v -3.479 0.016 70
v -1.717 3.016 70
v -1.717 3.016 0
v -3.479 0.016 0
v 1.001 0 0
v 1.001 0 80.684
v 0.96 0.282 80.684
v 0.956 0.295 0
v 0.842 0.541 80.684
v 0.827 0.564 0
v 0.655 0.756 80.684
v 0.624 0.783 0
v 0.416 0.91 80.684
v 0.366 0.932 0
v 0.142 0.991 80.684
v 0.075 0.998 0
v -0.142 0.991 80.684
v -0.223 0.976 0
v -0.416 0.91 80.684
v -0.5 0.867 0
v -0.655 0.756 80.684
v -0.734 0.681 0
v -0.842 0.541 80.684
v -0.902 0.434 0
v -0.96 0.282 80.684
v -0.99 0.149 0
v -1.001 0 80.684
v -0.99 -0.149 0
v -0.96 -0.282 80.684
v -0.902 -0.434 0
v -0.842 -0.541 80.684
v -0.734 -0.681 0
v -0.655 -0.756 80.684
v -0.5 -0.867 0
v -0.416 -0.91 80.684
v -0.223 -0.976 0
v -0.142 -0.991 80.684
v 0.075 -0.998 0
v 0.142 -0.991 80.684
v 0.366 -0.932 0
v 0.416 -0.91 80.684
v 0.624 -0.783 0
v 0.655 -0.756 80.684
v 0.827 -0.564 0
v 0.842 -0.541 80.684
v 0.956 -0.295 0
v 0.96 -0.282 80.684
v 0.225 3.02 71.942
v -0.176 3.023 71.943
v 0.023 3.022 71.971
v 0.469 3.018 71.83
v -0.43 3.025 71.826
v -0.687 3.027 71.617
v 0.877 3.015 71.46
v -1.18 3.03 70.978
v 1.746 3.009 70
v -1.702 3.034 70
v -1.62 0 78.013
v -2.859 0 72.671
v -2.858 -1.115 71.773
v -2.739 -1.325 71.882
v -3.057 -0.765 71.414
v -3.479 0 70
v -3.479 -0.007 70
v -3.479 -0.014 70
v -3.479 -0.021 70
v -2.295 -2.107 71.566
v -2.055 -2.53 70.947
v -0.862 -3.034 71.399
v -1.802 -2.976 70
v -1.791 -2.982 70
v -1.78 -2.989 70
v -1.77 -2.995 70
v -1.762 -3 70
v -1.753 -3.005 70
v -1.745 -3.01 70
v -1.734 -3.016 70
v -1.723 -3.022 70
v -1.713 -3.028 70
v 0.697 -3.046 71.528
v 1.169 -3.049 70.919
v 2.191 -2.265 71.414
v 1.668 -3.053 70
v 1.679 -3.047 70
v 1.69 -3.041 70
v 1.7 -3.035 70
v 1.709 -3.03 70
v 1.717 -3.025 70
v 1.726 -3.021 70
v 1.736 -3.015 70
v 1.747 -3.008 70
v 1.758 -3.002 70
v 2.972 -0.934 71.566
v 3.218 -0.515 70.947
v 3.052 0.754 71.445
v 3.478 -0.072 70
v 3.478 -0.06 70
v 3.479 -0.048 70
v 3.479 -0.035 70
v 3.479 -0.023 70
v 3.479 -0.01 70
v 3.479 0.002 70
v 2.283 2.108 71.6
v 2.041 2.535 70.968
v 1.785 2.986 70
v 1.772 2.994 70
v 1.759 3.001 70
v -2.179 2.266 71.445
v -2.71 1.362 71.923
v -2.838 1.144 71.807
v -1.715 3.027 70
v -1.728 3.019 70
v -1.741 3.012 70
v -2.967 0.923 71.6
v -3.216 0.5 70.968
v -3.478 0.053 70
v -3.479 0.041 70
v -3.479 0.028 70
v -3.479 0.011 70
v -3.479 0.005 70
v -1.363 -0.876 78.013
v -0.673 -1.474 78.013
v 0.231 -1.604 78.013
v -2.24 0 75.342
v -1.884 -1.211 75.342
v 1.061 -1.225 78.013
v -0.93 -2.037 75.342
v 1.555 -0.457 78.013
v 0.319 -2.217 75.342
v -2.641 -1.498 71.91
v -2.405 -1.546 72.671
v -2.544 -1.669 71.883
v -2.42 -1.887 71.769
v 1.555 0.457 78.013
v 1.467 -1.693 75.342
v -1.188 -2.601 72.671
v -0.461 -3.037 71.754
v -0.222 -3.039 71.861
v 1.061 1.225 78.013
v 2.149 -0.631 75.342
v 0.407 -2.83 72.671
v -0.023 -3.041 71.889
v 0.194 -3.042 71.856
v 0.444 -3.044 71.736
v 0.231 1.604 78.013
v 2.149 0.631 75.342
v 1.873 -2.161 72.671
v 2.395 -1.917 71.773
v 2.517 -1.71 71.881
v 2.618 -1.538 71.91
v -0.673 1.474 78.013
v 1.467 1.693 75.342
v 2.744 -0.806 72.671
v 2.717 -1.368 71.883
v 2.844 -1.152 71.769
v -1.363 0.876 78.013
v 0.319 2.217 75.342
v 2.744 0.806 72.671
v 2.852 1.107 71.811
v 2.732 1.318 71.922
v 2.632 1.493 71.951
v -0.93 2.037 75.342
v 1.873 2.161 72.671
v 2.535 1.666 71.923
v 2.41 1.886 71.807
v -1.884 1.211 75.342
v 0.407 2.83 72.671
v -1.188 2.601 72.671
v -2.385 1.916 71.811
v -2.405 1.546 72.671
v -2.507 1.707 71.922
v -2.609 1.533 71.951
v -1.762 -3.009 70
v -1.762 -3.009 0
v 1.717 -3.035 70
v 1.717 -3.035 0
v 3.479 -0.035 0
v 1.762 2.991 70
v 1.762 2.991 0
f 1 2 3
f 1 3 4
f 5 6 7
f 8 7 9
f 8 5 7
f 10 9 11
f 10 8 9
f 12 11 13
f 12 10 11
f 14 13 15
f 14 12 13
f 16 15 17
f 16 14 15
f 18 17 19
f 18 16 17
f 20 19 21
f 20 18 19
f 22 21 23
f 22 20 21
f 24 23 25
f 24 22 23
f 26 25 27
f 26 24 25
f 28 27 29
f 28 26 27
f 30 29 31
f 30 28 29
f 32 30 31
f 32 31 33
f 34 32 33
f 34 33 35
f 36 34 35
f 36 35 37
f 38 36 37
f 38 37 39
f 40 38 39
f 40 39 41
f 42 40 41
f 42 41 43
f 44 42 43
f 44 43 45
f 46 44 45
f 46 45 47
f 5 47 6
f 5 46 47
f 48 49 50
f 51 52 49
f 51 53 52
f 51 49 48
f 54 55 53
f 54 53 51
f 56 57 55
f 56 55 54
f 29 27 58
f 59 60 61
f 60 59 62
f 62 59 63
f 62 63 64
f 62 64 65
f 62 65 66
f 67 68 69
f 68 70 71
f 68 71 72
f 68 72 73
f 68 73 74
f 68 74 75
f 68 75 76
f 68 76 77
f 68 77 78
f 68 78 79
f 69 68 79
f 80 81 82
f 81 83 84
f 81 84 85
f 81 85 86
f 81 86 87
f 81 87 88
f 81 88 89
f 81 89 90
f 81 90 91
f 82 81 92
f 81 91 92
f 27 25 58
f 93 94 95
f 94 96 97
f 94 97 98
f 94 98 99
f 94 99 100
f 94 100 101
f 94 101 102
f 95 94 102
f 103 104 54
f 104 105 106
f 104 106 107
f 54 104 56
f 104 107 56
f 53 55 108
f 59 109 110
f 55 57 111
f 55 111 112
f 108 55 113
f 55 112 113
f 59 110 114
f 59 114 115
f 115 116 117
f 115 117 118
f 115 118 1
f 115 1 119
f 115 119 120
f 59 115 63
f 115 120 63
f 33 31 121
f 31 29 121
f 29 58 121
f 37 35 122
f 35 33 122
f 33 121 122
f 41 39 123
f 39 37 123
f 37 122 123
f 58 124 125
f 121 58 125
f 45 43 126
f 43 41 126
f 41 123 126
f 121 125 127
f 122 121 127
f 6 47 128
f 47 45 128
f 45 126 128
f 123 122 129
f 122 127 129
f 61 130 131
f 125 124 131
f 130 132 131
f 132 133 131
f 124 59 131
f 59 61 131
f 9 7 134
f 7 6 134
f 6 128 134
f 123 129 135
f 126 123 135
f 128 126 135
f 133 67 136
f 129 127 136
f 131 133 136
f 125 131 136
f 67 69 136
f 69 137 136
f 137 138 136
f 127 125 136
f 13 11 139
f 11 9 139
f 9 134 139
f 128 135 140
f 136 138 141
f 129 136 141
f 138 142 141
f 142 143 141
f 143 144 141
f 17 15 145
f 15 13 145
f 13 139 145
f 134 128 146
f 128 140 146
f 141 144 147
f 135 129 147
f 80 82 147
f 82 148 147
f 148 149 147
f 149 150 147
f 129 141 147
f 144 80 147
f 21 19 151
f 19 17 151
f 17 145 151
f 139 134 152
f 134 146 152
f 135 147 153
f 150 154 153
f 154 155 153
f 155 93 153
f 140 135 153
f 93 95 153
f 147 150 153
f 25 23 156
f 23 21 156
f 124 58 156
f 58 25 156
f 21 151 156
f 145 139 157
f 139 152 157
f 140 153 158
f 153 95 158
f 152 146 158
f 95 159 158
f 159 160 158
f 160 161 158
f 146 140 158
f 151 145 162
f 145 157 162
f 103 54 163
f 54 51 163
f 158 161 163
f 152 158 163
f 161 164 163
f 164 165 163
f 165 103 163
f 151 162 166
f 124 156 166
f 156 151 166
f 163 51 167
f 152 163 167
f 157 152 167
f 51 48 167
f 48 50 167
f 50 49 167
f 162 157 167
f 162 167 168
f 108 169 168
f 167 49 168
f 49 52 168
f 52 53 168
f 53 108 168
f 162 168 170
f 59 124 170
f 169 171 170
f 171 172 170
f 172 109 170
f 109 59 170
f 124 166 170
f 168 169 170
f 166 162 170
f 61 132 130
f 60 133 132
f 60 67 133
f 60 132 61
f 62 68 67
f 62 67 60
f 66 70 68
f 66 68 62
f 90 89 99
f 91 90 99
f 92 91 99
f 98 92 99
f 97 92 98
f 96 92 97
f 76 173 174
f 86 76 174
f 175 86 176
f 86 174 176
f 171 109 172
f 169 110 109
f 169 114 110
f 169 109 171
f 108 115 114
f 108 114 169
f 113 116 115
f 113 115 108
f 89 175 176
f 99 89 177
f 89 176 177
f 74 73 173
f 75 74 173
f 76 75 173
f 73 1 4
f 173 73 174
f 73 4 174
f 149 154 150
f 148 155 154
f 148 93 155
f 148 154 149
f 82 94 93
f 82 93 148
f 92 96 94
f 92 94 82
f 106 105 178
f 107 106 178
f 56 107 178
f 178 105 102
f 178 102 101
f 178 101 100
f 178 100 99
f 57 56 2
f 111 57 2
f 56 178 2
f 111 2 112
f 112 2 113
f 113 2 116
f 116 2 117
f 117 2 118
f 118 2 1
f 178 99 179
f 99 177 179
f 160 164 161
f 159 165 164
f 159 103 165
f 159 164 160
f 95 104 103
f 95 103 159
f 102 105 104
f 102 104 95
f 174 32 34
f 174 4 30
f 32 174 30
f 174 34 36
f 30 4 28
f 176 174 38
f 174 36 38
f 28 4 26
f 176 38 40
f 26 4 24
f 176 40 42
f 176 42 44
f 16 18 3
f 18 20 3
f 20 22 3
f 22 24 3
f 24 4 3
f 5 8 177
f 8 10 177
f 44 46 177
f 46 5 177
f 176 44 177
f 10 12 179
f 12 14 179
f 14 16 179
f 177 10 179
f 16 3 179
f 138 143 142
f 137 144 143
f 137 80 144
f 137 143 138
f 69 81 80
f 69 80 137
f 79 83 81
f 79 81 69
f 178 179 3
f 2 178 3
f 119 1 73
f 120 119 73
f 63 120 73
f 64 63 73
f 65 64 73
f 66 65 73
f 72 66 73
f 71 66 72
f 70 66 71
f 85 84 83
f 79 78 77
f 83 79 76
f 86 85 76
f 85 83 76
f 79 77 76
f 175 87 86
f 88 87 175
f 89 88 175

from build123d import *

# Parameters (mm, degrees)
F1_DEPTH = 70
F3_R     = 9.108661
F5_DEPTH = 85.001
F6_R     = 1.000895
F7_DEPTH = 85.001


with BuildPart() as f1:
    # F0 (on Top) → F1 (new body)
    with BuildSketch(Plane.XY):
        Polygon((-1.717262, 3.016132), (-3.47889, 0.016132), (-1.761628, -3.009482), (1.717262, -3.035097), (3.47889, -0.035097), (1.761628, 2.990518), align=None)
    extrude(amount=F1_DEPTH)

    # F2 (on Front) → F4 (revolve)
    with BuildSketch(Plane.XZ):
        Polygon((-3.47889, 70), (0, 70), (0, 85), align=None)
    revolve(axis=Axis((0, 0, 77.5), (0, 0, 1)))

    # F3 (on Top) → F5 (cut, through all)
    with BuildSketch(Plane.XY):
        with Locations((-4e-05, -0.009522)):
            Circle(F3_R)
        Polygon((-1.772364, -3.027722), (-3.50004, 0.016256), (-1.727715, 3.034456), (1.772285, 3.008678), (3.49996, -0.0353), (1.727636, -3.0535), align=None, mode=Mode.SUBTRACT)
    extrude(amount=F5_DEPTH, mode=Mode.SUBTRACT)

    # F6 (on Top) → F7 (cut, through all)
    with BuildSketch(Plane.XY):
        Circle(F6_R)
    extrude(amount=F7_DEPTH, mode=Mode.SUBTRACT)


solid = f1.part
